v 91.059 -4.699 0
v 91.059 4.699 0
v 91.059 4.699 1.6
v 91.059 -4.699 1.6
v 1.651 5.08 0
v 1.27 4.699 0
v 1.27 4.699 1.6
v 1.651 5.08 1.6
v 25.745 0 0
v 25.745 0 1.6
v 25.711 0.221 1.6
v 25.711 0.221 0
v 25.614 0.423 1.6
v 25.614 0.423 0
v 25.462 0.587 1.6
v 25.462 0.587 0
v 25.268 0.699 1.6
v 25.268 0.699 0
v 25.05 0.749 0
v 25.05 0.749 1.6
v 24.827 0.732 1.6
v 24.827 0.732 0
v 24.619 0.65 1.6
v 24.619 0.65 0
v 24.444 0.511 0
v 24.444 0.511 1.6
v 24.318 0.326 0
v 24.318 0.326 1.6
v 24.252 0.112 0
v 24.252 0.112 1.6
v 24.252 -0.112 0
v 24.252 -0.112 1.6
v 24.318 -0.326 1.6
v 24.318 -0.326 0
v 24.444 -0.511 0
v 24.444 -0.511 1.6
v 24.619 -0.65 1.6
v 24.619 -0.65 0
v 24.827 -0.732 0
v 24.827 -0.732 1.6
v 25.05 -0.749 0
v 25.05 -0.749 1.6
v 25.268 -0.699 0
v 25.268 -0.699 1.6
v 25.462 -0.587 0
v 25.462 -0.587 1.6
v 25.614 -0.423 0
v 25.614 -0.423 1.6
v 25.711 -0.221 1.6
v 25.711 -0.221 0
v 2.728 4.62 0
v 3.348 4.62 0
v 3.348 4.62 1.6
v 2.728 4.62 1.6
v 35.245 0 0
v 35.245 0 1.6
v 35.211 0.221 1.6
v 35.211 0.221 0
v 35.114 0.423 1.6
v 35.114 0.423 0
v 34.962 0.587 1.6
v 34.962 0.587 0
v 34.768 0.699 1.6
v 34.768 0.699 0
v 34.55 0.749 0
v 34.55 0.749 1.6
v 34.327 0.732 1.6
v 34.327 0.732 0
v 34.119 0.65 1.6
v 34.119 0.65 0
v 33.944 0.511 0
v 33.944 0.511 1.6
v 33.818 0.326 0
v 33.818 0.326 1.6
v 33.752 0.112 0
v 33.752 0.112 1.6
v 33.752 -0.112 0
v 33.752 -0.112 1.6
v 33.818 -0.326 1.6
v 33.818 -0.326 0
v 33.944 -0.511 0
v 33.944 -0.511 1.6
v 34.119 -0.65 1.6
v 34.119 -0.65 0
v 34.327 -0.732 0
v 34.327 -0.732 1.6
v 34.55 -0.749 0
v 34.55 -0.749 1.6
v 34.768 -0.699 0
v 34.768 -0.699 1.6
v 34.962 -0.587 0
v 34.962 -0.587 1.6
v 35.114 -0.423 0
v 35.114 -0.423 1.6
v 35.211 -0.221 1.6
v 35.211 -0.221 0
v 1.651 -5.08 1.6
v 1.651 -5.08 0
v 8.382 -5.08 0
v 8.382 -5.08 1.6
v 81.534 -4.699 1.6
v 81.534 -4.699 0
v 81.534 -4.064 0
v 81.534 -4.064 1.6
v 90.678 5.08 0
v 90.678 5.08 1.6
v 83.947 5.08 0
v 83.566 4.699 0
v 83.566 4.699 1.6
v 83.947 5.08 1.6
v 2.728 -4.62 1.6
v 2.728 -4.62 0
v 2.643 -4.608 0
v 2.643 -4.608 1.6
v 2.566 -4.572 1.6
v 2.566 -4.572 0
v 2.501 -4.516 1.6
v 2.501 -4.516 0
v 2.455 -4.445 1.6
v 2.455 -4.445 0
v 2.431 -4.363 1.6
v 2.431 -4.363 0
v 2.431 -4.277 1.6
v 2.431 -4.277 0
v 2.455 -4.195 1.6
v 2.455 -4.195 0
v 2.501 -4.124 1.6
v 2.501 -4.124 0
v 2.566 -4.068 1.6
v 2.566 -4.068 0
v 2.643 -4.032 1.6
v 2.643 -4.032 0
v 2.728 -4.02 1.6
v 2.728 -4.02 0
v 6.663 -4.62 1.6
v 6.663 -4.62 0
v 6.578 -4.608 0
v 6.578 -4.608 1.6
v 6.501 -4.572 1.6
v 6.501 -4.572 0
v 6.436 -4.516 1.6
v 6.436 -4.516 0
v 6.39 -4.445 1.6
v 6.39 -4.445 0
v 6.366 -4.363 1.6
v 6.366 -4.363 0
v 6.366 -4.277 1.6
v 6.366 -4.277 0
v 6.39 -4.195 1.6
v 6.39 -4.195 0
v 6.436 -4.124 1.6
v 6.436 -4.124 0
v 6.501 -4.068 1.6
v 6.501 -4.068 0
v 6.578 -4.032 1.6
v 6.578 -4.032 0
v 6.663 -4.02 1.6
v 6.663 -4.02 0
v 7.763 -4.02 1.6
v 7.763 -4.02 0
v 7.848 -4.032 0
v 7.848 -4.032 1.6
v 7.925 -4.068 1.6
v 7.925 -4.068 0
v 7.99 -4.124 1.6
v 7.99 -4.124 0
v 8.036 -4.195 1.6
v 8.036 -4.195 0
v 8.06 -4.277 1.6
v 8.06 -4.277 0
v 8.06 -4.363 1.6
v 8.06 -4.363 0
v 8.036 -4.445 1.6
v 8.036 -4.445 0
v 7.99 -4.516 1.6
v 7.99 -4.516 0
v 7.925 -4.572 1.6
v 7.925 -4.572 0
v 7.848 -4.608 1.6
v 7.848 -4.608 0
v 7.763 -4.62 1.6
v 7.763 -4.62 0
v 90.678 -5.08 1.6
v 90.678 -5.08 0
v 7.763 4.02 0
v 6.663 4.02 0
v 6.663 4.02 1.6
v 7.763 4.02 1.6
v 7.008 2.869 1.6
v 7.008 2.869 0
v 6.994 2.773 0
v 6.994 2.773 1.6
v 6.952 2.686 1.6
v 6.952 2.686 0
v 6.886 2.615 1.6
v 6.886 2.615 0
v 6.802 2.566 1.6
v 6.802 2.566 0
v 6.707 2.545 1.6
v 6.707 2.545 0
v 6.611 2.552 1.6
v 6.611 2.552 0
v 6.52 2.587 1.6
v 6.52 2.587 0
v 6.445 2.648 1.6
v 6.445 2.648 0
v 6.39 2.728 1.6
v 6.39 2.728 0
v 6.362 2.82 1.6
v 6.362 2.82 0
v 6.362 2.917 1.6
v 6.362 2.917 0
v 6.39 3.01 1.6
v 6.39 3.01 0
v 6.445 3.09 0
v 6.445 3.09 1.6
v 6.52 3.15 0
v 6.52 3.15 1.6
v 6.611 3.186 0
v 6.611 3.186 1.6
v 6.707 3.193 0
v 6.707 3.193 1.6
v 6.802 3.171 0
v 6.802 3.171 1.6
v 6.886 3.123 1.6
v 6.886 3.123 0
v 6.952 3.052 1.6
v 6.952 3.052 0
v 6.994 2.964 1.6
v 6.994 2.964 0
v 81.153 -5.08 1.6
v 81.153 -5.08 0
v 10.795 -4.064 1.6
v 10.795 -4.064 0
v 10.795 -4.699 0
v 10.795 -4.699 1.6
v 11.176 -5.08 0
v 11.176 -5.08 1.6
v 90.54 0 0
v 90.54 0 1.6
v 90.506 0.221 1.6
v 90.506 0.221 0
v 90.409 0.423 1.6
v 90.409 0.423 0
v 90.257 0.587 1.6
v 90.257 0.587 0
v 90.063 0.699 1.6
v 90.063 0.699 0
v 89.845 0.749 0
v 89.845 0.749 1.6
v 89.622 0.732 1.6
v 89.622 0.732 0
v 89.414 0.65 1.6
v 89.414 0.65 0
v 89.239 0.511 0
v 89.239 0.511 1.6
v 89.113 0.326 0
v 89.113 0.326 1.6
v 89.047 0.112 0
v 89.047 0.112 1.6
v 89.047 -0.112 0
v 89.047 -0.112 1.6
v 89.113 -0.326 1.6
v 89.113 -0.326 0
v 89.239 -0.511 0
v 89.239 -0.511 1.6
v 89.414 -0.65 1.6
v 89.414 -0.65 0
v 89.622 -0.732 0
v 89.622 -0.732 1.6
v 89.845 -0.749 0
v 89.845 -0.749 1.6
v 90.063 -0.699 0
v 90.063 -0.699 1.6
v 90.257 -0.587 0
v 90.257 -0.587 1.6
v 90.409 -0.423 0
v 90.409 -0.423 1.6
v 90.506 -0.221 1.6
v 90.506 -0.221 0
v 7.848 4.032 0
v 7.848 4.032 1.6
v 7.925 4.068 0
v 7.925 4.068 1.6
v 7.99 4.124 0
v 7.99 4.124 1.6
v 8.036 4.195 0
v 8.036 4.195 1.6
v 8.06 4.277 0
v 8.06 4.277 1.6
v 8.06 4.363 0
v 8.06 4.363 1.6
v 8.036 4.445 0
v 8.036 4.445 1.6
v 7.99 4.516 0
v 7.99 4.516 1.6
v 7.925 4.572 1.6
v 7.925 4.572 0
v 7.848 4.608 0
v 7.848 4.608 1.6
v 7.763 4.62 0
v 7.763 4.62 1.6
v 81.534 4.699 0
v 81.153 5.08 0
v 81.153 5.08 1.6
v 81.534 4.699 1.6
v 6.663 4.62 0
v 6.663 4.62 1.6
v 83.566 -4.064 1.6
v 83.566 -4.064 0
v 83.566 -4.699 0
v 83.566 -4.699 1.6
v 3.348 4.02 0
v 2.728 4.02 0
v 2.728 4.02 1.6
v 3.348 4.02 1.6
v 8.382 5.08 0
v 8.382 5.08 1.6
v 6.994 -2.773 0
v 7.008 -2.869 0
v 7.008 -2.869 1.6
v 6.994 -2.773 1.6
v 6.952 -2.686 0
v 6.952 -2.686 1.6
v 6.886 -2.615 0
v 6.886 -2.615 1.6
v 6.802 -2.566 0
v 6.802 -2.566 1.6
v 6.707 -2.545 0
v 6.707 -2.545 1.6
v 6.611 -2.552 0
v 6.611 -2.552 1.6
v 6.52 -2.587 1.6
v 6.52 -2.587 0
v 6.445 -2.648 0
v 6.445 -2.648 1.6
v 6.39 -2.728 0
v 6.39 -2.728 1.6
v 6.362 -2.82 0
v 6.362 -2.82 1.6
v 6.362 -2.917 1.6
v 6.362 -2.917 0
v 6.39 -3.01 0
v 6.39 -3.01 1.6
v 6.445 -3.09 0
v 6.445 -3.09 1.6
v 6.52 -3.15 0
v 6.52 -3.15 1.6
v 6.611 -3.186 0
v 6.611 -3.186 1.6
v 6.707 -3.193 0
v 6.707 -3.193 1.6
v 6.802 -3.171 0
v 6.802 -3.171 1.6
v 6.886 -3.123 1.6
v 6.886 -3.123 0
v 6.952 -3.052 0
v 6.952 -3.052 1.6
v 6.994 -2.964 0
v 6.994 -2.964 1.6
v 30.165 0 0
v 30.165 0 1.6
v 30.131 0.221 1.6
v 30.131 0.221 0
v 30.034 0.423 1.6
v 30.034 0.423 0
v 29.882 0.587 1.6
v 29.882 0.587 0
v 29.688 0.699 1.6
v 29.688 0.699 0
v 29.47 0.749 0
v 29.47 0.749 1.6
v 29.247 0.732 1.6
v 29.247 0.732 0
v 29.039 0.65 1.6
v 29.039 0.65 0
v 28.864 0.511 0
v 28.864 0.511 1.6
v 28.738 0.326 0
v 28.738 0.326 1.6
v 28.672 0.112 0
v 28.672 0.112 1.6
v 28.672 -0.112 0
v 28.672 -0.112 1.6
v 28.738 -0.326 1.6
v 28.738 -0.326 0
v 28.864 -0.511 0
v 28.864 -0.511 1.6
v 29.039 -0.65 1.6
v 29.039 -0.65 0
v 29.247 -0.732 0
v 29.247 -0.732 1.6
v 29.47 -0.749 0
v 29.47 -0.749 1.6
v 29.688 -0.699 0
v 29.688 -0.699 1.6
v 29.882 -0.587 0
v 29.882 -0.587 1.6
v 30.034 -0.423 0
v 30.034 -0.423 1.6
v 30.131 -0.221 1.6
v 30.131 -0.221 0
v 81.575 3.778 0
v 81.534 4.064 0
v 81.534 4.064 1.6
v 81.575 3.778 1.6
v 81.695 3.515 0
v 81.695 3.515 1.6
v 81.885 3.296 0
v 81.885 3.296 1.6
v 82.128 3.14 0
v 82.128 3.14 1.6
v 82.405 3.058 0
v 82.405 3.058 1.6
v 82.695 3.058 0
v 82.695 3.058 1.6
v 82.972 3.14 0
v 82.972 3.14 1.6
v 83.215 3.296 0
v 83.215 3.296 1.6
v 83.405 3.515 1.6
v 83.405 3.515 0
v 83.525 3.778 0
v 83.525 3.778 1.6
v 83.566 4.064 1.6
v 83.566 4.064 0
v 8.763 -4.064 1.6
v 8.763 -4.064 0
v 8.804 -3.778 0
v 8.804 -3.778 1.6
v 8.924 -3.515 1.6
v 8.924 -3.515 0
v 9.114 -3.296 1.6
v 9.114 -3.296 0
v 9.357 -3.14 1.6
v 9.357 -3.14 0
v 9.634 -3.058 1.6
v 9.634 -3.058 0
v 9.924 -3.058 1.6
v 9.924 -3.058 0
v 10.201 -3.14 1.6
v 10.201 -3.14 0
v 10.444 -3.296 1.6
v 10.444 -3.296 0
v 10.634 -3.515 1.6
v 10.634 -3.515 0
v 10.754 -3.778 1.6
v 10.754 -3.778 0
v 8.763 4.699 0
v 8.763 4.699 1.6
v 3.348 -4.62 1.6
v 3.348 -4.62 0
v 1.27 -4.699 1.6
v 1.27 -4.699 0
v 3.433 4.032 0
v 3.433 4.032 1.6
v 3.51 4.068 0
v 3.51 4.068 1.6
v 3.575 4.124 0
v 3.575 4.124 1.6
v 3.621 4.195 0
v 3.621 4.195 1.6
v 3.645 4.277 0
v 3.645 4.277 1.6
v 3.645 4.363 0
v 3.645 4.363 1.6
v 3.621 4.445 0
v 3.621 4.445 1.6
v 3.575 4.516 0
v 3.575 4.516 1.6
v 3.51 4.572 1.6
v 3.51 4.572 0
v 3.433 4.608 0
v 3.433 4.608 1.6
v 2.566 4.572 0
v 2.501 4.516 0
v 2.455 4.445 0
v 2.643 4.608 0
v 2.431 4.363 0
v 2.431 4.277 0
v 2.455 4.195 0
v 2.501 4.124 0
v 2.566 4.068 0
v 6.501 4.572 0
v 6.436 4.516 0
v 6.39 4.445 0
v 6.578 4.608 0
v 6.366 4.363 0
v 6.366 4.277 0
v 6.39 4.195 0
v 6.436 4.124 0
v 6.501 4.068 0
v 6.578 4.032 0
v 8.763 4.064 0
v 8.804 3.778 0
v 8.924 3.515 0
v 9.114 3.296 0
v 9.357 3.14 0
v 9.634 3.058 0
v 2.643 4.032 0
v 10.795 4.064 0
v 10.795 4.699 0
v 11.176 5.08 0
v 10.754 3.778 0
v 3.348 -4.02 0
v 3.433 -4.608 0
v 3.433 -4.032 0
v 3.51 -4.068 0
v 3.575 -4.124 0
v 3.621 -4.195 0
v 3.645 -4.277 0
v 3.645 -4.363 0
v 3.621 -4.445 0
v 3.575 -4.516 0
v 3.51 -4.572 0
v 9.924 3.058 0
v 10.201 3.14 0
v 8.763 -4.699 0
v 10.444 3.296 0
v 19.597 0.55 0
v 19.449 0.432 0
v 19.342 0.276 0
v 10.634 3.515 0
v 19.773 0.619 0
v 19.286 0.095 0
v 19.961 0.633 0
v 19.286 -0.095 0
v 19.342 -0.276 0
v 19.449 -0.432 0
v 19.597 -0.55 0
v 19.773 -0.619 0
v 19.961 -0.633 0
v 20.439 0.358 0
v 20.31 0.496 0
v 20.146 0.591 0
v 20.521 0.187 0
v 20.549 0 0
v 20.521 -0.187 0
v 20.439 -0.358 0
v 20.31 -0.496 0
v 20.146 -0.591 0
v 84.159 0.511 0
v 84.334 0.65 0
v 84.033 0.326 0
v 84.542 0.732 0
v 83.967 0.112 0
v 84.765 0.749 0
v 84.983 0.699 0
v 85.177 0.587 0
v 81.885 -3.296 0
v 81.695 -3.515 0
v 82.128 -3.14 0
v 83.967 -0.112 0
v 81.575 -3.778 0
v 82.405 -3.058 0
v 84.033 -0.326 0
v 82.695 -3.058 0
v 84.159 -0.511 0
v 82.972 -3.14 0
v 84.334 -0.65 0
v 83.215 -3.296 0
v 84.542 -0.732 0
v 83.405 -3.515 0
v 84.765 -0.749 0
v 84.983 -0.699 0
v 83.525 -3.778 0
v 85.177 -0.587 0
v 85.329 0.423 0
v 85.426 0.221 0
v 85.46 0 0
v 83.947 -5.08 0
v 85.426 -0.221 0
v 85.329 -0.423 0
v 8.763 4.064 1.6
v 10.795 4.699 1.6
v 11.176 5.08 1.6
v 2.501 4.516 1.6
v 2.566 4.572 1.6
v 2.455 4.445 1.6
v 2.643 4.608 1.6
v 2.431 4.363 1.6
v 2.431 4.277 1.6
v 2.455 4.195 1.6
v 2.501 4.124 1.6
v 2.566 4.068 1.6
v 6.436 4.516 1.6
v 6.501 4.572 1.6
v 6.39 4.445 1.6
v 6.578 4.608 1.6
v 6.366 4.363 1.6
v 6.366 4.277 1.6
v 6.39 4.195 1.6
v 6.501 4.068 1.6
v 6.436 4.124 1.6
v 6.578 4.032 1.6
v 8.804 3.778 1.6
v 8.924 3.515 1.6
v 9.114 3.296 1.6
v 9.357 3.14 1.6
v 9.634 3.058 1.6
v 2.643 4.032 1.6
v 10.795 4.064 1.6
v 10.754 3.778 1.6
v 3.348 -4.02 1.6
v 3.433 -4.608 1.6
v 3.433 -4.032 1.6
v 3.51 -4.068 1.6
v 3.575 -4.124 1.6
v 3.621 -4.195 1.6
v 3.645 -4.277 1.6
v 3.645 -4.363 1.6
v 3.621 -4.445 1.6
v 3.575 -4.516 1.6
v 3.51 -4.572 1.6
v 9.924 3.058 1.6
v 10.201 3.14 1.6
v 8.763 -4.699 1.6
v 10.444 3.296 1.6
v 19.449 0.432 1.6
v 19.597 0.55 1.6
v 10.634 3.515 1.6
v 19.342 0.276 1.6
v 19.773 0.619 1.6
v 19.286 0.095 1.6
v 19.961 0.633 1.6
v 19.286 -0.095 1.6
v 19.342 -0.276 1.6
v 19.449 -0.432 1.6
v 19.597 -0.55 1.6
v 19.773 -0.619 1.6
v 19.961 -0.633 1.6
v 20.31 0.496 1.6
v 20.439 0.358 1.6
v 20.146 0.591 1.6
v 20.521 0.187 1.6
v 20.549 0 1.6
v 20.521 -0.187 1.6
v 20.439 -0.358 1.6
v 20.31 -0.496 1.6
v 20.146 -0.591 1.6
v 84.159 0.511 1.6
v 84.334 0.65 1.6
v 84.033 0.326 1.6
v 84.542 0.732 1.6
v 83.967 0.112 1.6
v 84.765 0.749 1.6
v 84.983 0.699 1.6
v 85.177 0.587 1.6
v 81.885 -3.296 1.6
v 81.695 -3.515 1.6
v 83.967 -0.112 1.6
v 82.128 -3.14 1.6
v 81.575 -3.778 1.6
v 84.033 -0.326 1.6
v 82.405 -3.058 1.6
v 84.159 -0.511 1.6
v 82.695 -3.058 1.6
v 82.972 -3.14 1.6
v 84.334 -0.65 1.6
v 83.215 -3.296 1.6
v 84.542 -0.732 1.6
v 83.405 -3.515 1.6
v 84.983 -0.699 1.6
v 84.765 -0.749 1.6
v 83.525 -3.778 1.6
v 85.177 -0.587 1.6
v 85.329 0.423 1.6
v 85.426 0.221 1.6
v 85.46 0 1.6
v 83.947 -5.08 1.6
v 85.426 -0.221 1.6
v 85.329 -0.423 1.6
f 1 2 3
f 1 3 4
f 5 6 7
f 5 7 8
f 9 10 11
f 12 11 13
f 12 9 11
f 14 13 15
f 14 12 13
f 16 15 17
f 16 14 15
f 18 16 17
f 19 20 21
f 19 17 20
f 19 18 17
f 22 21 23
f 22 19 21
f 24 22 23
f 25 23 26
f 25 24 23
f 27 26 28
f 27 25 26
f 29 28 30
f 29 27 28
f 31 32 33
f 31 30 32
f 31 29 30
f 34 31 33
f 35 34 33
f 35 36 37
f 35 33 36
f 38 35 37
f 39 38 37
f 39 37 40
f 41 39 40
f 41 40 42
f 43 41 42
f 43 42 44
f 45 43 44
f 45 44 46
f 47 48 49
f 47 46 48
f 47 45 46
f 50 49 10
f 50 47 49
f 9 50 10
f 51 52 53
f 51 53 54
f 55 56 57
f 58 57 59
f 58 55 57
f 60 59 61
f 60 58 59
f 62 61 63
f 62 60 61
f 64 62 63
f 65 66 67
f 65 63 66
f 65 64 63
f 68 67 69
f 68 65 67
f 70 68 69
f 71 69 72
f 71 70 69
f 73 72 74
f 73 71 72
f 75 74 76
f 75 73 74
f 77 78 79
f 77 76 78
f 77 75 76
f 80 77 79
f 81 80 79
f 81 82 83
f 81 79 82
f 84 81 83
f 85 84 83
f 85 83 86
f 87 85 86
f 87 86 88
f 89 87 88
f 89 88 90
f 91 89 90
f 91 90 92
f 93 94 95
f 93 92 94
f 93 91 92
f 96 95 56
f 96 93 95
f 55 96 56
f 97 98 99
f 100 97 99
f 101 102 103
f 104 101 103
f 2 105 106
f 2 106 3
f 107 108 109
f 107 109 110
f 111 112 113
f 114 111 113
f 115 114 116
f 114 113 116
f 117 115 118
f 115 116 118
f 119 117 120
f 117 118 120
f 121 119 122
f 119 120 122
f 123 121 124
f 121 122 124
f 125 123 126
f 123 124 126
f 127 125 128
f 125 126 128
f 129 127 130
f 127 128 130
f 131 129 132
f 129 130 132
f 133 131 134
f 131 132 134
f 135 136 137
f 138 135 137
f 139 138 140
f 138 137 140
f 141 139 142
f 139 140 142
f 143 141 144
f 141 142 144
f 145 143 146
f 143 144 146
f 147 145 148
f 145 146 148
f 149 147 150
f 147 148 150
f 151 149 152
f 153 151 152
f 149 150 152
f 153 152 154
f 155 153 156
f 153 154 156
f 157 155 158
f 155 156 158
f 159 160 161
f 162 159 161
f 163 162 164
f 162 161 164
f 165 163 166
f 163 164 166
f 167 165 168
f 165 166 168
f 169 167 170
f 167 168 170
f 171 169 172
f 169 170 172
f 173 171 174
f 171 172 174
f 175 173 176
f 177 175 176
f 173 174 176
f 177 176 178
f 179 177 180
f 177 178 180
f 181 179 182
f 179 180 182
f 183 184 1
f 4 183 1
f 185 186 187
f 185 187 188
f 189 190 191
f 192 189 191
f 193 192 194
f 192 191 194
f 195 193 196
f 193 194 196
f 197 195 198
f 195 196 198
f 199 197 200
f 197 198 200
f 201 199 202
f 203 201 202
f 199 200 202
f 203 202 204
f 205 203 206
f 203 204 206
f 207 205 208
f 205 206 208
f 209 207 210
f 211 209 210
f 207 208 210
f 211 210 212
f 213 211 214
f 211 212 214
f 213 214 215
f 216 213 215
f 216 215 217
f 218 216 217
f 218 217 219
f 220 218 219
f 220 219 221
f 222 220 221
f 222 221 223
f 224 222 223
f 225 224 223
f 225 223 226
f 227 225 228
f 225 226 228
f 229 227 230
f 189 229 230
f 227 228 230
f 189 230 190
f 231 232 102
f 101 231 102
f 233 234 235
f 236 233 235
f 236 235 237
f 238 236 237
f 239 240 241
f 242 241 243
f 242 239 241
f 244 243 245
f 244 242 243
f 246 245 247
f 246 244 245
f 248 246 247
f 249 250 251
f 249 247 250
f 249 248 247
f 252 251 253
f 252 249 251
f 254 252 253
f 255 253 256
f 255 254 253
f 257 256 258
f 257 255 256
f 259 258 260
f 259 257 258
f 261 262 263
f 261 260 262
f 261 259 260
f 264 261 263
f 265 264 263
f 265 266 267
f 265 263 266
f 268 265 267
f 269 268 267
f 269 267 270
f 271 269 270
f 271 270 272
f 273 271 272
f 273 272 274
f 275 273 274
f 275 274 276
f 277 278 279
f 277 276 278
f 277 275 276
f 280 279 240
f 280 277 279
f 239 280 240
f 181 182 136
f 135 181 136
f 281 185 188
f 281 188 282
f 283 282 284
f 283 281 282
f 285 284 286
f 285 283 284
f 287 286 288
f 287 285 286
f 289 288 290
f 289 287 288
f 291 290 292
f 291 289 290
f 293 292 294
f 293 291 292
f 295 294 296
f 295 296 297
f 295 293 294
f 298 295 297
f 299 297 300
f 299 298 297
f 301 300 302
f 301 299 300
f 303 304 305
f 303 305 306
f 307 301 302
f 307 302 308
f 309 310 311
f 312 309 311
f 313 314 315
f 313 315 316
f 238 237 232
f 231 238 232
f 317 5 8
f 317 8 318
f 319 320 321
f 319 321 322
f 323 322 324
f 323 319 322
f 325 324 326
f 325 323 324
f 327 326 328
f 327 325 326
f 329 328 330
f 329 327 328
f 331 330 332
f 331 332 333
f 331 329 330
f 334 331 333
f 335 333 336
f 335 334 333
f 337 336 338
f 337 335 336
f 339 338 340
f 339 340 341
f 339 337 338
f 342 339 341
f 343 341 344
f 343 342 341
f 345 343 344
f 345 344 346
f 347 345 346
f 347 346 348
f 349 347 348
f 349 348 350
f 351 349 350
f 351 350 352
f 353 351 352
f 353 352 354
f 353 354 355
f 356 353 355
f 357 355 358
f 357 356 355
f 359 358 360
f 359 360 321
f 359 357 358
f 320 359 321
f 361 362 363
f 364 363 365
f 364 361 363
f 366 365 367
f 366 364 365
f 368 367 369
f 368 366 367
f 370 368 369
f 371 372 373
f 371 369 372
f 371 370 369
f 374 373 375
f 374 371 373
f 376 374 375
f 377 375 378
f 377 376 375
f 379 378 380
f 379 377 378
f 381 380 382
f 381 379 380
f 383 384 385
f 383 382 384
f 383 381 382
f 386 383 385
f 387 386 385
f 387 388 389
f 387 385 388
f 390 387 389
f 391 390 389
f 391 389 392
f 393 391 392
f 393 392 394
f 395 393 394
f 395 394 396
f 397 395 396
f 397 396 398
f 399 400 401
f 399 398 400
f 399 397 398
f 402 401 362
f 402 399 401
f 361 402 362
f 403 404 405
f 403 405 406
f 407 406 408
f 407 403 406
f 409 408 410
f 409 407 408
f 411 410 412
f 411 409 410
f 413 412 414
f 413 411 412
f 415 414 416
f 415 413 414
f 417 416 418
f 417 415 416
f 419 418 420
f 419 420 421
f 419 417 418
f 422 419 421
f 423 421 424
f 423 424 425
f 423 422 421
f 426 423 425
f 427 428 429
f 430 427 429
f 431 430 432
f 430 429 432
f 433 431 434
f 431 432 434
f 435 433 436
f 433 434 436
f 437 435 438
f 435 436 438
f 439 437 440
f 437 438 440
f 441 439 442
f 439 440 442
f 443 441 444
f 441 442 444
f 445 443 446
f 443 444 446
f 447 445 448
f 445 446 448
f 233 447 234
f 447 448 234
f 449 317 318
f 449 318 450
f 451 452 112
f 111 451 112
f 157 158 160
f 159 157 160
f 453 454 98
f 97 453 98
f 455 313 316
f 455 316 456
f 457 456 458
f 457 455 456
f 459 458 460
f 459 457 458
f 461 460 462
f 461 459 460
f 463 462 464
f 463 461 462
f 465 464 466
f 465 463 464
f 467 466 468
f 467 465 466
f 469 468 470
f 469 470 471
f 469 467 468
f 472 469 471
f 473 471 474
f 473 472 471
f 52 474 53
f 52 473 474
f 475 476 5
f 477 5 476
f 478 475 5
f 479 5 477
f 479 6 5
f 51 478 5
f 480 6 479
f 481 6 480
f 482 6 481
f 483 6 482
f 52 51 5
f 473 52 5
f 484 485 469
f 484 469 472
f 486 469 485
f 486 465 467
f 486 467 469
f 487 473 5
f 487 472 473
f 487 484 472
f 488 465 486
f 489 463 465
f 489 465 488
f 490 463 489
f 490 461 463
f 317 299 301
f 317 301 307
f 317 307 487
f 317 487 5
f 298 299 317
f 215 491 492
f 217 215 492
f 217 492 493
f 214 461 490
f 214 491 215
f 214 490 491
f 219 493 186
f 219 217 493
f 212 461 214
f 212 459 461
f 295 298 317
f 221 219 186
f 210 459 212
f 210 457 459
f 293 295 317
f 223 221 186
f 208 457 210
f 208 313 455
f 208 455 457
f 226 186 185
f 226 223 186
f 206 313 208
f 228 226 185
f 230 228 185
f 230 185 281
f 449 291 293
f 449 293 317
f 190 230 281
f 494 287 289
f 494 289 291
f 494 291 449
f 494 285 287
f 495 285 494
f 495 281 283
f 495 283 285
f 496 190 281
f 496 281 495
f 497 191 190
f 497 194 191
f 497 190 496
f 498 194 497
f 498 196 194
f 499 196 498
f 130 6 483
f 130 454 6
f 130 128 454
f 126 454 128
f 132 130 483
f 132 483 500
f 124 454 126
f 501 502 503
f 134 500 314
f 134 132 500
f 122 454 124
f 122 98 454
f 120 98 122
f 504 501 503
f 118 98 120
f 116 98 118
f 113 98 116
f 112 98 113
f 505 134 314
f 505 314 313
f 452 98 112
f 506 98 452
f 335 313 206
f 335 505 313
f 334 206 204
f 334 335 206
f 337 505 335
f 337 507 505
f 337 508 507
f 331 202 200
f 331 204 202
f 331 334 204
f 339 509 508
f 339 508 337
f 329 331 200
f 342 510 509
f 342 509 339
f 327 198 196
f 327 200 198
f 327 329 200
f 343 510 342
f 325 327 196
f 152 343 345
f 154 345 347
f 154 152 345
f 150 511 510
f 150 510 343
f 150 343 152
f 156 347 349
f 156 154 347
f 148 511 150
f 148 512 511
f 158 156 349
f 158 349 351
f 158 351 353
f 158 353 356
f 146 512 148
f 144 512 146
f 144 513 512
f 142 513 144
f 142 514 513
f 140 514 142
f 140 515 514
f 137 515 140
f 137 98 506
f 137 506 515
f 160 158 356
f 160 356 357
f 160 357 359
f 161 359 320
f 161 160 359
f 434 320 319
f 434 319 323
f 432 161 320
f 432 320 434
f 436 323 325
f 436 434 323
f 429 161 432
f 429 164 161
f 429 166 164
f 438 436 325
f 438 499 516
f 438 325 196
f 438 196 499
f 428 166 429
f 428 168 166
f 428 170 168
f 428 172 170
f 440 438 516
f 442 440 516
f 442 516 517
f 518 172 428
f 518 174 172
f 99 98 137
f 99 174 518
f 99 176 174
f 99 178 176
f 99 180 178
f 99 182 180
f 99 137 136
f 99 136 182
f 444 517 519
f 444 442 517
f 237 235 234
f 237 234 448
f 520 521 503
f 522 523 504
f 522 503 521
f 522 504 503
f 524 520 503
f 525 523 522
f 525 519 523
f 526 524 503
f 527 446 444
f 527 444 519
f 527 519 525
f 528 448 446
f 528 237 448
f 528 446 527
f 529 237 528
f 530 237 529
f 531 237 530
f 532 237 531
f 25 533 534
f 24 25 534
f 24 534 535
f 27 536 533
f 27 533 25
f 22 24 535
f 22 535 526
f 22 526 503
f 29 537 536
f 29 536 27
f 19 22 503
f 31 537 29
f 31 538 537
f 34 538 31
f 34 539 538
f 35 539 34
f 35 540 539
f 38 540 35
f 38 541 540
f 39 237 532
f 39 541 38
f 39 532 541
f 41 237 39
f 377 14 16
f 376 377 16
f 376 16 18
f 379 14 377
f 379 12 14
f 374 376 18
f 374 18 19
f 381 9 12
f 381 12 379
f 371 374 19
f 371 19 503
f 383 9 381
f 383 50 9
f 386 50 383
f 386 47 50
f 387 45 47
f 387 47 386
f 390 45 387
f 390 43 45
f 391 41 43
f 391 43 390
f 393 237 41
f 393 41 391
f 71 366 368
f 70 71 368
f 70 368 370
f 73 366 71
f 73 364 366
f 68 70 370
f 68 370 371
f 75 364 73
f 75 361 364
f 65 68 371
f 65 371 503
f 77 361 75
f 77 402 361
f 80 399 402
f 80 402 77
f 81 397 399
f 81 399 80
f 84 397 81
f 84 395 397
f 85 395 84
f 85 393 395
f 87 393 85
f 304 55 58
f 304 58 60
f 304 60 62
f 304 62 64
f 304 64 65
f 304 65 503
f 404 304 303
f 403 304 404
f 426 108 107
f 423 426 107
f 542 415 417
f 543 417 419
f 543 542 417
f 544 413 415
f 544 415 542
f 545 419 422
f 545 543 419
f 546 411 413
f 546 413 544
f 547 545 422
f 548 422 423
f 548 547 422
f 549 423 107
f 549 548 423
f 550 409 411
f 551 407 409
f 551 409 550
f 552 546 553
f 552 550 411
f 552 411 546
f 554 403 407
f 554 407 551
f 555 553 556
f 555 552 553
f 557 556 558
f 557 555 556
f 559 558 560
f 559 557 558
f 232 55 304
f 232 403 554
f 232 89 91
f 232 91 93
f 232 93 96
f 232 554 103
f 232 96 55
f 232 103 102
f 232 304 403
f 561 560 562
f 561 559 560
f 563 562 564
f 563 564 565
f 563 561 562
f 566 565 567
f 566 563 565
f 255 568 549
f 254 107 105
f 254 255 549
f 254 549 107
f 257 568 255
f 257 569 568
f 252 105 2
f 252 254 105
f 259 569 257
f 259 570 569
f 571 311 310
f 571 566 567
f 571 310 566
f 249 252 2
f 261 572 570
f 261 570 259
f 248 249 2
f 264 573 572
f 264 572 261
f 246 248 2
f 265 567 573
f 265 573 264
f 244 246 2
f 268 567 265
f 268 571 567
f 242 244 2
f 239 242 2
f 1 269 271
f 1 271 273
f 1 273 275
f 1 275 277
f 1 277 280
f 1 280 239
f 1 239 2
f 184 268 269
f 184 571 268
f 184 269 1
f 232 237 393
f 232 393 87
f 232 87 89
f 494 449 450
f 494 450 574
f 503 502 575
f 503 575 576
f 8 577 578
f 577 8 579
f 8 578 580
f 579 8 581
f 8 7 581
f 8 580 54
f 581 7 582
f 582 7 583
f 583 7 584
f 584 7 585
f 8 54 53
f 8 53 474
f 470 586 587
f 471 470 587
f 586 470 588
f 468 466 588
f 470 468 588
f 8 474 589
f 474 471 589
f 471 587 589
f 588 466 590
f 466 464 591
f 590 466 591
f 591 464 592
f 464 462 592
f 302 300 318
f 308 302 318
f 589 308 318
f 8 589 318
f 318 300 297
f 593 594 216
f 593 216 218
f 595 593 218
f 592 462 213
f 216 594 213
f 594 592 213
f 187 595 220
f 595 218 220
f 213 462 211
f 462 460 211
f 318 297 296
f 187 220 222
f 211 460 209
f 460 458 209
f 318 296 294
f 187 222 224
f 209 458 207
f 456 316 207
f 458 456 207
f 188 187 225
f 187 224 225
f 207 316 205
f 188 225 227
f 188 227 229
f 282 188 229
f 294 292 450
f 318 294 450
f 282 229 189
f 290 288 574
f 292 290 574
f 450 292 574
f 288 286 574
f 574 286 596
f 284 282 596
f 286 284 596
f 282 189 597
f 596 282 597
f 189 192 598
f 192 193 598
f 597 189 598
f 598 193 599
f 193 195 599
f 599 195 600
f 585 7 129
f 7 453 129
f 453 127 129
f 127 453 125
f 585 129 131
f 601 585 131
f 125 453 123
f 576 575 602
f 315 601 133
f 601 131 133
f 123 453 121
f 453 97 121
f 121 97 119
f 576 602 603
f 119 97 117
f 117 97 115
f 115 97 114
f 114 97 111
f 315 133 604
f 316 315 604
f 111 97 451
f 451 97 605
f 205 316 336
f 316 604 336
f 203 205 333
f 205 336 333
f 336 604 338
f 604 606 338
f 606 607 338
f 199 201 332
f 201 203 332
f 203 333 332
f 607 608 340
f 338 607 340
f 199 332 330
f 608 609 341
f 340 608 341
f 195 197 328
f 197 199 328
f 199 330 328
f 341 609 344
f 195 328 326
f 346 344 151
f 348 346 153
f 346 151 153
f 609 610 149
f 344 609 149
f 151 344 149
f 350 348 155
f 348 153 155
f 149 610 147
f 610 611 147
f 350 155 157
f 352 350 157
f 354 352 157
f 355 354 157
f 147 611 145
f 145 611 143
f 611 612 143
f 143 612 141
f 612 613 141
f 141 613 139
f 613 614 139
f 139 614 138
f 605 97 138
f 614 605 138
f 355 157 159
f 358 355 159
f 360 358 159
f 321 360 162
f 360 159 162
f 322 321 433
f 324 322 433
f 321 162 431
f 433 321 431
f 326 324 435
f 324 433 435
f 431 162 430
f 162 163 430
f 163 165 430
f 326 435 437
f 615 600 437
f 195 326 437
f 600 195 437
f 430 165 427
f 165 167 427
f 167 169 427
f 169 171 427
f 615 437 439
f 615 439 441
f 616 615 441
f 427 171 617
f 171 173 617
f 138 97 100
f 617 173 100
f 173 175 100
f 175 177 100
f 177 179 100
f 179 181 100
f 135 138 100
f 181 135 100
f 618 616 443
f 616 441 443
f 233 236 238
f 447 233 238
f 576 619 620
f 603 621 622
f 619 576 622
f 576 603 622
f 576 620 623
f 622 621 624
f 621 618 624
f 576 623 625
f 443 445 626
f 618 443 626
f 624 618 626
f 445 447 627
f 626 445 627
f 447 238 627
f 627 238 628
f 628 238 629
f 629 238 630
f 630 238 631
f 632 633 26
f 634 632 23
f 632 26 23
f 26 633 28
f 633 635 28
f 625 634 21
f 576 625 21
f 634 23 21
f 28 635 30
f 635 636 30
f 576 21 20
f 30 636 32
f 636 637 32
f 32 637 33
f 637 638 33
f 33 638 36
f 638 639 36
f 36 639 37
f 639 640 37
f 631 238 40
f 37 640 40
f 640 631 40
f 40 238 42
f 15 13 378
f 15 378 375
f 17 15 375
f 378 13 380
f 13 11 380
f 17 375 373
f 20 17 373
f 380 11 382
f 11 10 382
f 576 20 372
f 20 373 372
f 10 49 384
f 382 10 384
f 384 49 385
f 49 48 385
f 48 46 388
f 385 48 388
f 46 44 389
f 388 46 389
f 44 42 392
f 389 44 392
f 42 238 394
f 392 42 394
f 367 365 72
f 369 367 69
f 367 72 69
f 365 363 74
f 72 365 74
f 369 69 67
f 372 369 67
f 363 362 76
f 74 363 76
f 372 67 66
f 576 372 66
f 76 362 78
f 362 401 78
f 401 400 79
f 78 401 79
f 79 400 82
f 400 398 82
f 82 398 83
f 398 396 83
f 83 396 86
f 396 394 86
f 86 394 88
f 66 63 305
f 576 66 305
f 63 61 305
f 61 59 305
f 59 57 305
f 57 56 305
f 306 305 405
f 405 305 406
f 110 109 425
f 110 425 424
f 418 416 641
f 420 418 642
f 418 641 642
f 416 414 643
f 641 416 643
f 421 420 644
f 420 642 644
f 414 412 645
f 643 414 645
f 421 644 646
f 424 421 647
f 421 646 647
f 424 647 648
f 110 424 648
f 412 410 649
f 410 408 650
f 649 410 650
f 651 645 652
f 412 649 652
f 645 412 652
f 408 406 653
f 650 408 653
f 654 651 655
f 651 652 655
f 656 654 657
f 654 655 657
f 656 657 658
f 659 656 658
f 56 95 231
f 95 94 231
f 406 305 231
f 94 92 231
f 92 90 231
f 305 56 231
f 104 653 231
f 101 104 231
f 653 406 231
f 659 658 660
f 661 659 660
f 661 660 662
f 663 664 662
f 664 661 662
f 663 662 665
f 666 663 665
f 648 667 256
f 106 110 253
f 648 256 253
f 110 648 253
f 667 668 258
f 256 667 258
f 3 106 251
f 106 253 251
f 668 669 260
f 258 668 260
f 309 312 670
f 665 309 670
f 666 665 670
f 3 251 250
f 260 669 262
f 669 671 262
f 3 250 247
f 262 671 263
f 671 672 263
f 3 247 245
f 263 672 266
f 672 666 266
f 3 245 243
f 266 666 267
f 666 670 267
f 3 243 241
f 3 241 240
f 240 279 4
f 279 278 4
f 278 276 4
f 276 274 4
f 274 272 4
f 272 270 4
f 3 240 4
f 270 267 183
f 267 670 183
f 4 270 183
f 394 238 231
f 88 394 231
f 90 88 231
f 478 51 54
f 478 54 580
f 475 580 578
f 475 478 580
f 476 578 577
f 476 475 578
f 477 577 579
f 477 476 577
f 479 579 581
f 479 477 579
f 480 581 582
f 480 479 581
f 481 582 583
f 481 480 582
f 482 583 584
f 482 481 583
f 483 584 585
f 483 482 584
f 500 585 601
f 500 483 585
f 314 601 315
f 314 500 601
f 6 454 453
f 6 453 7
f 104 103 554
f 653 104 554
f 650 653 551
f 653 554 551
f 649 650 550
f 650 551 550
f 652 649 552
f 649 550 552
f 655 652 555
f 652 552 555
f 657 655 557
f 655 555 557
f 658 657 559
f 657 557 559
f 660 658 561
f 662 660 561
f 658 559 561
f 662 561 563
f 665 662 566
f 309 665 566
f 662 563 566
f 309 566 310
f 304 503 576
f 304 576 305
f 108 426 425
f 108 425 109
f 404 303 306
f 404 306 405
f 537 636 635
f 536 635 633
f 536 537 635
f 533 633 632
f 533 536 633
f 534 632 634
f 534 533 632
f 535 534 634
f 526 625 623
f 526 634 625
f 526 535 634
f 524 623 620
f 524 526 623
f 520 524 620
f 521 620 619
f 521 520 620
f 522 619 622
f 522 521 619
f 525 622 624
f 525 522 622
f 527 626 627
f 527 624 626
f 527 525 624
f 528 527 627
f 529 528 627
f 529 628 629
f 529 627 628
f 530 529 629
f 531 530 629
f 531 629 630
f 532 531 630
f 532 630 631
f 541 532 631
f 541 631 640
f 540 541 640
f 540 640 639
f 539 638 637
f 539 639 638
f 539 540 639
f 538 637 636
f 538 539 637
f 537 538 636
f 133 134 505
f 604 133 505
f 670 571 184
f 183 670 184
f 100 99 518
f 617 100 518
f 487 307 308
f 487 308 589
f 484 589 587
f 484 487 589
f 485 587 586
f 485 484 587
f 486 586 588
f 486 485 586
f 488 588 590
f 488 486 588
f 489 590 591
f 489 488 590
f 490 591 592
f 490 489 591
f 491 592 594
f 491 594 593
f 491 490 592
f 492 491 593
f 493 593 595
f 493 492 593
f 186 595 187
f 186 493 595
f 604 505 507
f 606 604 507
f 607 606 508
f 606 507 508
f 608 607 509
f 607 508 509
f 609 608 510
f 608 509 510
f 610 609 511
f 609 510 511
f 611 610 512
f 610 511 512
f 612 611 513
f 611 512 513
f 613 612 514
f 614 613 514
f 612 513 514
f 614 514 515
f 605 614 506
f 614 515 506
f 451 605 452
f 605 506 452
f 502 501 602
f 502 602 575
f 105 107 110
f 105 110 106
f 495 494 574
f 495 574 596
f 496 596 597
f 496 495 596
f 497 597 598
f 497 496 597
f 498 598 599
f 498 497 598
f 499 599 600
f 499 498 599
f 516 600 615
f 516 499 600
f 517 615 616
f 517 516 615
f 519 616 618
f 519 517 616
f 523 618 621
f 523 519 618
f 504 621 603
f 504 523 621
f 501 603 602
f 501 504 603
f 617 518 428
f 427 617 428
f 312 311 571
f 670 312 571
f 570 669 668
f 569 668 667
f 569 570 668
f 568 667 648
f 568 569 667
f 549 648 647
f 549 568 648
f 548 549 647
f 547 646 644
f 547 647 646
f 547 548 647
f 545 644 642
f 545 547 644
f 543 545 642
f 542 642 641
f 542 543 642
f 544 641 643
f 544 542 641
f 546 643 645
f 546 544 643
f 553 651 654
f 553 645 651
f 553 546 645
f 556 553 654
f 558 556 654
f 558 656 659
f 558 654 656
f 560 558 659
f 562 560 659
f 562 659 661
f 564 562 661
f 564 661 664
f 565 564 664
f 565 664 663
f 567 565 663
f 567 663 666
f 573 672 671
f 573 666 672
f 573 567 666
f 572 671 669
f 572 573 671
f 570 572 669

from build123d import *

# Parameters (mm, degrees)
EXTRUDE_1_OUTLINE_R = 0.325
EXTRUDE_1_DEPTH     = 1.6
SKETCH_1_R          = 0.635
SKETCH_1_R_2        = 0.750616105
CUT_EXTRUDE_1_DEPTH = 92.214625368


# Read off the part's stored shape, not the designer's step: 凸台-拉伸1
with BuildPart() as part:
    # 凸台-拉伸1 outline → 凸台-拉伸1 (new body)
    with BuildSketch(Plane.XY):
        with BuildLine():
            Line((81.153, -5.08), (81.534, -4.699))
            Line((81.534, -4.699), (81.534, -4.064))
            ThreePointArc((81.534, -4.064), (82.55, -3.048), (83.566, -4.064))
            Line((83.566, -4.064), (83.566, -4.699))
            Line((83.566, -4.699), (83.947, -5.08))
            Line((83.947, -5.08), (90.678, -5.08))
            Line((90.678, -5.08), (91.059, -4.699))
            Line((91.059, -4.699), (91.059, 0))
            Line((91.059, 0), (1.27, 0))
            Line((1.27, 0), (1.27, -4.699))
            Line((1.27, -4.699), (1.651, -5.08))
            Line((1.651, -5.08), (8.382, -5.08))
            Line((8.382, -5.08), (8.763, -4.699))
            Line((8.763, -4.699), (8.763, -4.064))
            ThreePointArc((8.763, -4.064), (9.779, -3.048), (10.795, -4.064))
            Line((10.795, -4.064), (10.795, -4.699))
            Line((10.795, -4.699), (11.176, -5.08))
            Line((11.176, -5.08), (81.153, -5.08))
        make_face()
        with BuildLine():
            Line((2.728, -4.02), (3.348, -4.02))
            ThreePointArc((3.348, -4.02), (3.648, -4.32), (3.348, -4.62))
            Line((3.348, -4.62), (2.728, -4.62))
            ThreePointArc((2.728, -4.62), (2.428, -4.32), (2.728, -4.02))
        make_face(mode=Mode.SUBTRACT)
        with BuildLine():
            Line((7.763, -4.62), (6.663, -4.62))
            ThreePointArc((6.663, -4.62), (6.363, -4.32), (6.663, -4.02))
            Line((6.663, -4.02), (7.763, -4.02))
            ThreePointArc((7.763, -4.02), (8.063, -4.32), (7.763, -4.62))
        make_face(mode=Mode.SUBTRACT)
        with Locations((6.683, -2.8687)):
            Circle(EXTRUDE_1_OUTLINE_R, mode=Mode.SUBTRACT)
    extrude_1 = extrude(amount=EXTRUDE_1_DEPTH)

    # 镜向1: 凸台-拉伸1 across plane
    add(extrude_1.mirror(Plane(origin=(0, 0, 1.6), x_dir=(0, 0, 1), z_dir=(0, 1, 0))))

    # 草图1 → 切除-拉伸1 (cut, through all)
    with BuildSketch(Plane.XY):
        with Locations((19.914, 0)):
            Circle(SKETCH_1_R)
        with Locations((24.994, 0)):
            Circle(SKETCH_1_R_2)
        with Locations((29.414, 0)):
            Circle(SKETCH_1_R_2)
        with Locations((34.494, 0)):
            Circle(SKETCH_1_R_2)
        with Locations((89.789, 0)):
            Circle(SKETCH_1_R_2)
        with Locations((84.709, 0)):
            Circle(SKETCH_1_R_2)
    extrude(amount=CUT_EXTRUDE_1_DEPTH, mode=Mode.SUBTRACT)


solid = part.part
